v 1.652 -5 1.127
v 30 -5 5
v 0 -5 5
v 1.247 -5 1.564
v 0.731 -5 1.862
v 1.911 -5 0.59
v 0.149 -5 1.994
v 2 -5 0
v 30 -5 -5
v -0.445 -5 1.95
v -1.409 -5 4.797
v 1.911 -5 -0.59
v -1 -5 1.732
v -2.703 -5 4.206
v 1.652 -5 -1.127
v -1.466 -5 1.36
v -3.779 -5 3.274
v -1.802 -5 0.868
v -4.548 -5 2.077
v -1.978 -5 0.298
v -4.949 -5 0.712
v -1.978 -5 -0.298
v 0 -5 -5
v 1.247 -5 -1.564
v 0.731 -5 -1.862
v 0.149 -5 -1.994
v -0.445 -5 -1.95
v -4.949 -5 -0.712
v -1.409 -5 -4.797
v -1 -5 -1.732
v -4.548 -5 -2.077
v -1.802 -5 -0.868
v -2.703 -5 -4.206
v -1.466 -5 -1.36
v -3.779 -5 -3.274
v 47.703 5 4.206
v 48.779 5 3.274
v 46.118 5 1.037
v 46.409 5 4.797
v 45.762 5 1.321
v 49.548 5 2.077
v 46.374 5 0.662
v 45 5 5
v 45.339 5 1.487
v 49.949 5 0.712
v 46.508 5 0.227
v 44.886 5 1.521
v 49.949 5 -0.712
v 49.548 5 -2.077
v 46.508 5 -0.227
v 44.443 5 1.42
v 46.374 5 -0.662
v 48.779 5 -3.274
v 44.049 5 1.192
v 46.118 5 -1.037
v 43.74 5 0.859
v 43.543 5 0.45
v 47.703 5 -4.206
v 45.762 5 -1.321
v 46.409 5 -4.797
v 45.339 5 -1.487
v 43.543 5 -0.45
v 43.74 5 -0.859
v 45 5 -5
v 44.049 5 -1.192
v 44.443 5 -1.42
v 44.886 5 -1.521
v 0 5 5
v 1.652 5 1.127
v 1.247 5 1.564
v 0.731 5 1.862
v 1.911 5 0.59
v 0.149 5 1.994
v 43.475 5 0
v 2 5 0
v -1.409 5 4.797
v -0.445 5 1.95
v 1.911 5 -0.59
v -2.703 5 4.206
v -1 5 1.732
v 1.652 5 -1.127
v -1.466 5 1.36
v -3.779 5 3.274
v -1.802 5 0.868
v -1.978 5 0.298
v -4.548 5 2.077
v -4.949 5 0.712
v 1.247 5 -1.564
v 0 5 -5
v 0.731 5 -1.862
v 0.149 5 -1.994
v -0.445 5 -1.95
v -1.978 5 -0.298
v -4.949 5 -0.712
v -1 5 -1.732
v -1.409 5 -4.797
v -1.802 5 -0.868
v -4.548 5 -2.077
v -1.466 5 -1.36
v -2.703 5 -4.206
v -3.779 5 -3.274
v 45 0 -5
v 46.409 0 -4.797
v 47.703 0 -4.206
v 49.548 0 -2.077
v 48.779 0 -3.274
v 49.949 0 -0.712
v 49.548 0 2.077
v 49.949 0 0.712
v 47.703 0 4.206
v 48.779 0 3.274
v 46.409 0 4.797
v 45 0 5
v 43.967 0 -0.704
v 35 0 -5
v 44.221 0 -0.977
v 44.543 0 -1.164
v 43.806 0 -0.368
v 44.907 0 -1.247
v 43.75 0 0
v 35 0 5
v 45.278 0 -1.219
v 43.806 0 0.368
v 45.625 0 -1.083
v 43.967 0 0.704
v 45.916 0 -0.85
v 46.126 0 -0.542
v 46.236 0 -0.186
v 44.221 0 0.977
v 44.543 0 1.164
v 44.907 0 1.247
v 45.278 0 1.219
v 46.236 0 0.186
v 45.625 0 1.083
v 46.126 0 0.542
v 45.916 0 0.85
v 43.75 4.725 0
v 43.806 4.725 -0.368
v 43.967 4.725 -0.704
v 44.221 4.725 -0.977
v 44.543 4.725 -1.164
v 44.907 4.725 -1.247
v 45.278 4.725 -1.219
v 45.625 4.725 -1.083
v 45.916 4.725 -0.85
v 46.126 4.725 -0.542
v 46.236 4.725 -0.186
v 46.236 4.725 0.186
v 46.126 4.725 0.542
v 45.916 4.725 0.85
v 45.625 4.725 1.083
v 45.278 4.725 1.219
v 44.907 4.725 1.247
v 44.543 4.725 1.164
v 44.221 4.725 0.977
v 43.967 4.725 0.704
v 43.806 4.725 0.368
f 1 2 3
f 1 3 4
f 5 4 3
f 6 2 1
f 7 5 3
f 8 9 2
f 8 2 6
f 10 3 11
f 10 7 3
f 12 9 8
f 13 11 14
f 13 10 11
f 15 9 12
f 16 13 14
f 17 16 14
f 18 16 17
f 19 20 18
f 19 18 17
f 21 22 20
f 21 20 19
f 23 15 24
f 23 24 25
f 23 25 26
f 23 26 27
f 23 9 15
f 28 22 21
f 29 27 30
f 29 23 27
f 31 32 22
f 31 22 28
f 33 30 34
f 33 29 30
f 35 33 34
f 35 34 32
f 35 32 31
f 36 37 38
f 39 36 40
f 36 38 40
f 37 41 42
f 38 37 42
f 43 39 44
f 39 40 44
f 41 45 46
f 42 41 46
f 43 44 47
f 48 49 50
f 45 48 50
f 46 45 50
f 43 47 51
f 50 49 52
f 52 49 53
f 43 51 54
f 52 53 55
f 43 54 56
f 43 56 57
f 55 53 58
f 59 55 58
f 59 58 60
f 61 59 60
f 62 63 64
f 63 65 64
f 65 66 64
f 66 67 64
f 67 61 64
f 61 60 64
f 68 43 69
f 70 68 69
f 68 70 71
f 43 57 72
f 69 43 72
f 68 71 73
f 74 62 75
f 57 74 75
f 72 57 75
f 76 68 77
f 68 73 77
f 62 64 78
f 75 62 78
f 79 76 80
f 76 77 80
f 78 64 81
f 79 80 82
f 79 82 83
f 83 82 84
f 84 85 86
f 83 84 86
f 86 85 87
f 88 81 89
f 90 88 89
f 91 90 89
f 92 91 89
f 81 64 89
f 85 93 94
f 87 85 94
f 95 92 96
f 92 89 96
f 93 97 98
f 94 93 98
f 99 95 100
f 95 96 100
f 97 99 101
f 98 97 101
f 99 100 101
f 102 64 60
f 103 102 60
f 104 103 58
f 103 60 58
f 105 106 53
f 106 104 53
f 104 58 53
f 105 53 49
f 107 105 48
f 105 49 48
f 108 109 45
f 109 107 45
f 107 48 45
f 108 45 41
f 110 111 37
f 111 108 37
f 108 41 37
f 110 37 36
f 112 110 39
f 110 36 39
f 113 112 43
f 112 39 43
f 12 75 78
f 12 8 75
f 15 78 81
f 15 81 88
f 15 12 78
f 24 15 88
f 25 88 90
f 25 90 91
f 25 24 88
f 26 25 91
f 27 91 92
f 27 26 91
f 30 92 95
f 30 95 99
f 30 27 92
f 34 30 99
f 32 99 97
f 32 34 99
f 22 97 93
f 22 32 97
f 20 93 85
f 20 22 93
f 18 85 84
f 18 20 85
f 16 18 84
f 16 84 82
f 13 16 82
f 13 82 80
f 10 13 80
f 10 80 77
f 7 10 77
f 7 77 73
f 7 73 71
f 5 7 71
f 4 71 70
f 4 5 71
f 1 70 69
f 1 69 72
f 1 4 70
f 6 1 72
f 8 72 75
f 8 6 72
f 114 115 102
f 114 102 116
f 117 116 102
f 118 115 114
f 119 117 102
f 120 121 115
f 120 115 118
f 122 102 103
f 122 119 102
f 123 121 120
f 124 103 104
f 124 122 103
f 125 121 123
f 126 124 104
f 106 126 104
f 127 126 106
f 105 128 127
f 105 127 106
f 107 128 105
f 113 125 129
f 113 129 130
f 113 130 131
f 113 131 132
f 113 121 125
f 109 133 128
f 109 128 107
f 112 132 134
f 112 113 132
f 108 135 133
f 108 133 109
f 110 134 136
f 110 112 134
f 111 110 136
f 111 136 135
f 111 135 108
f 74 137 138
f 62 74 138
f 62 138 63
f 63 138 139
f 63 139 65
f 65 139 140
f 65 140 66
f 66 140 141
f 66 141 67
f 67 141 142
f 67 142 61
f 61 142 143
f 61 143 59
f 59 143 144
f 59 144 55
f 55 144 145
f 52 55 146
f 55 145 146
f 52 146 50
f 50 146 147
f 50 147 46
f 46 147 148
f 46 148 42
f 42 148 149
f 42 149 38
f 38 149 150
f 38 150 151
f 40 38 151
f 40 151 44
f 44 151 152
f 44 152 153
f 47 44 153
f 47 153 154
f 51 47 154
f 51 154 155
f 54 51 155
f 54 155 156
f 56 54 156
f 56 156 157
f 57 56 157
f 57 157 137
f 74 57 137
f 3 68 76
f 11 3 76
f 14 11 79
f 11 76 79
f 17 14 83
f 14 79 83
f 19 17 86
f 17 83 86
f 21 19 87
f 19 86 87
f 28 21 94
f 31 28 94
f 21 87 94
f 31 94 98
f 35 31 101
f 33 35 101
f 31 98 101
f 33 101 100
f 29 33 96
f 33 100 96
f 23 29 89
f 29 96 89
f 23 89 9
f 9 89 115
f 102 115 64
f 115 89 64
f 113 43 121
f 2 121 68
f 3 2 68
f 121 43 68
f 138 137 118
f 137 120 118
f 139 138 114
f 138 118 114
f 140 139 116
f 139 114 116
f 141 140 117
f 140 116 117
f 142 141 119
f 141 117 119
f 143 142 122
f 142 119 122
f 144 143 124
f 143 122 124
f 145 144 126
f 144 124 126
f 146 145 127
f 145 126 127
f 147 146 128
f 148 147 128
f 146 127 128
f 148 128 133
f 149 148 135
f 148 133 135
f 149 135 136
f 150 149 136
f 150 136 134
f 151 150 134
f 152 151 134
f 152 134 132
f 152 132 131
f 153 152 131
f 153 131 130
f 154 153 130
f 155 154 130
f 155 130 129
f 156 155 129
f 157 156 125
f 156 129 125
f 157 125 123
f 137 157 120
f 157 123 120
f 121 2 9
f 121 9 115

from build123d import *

# Parameters (mm, degrees)
ESQUISSE1_R                     = 2
BOSS_EXTRU_1_DEPTH              = 5
TROU_TARAUD_M3X0_51_D           = 2.5
TROU_TARAUD_M3X0_51_CSINK_D     = 3.05
TROU_TARAUD_M3X0_51_CSINK_ANGLE = 90
ENL_V_MAT_EXTRU_1_DEPTH         = 6
ENL_V_MAT_EXTRU_1_DEPTH_BACK    = 6


with BuildPart() as part:
    # Esquisse1 → Boss.-Extru.1 (new body, symmetric)
    with BuildSketch(Plane(origin=(0, 0, 0), x_dir=(1, 0, 0), z_dir=(0, 1, 0))):
        with BuildLine():
            Line((0, 5), (45, 5))
            ThreePointArc((45, 5), (50, 0), (45, -5))
            Line((45, -5), (0, -5))
            ThreePointArc((0, -5), (-5, 0), (0, 5))
        make_face()
        Circle(ESQUISSE1_R, mode=Mode.SUBTRACT)
    extrude(amount=BOSS_EXTRU_1_DEPTH, both=True)

    # Trou taraudé M3x0.51 (through all)
    with Locations(Plane(origin=(0, 5, 0), x_dir=(1, 0, 0), z_dir=(0, 1, 0))):
        with Locations((45, 0)):
            CounterSinkHole(TROU_TARAUD_M3X0_51_D / 2, TROU_TARAUD_M3X0_51_CSINK_D / 2, counter_sink_angle=TROU_TARAUD_M3X0_51_CSINK_ANGLE)

    # Esquisse4 → Enlèv. mat.-Extru.1 (cut, two sides)
    with BuildSketch(Plane.XY) as enl_v_mat_extru_1_sk:
        Polygon((35, 0), (50, 0), (50, -5), (30, -5), align=None)
    extrude(amount=ENL_V_MAT_EXTRU_1_DEPTH, mode=Mode.SUBTRACT)
    extrude(enl_v_mat_extru_1_sk.sketch, amount=-ENL_V_MAT_EXTRU_1_DEPTH_BACK, mode=Mode.SUBTRACT)


solid = part.part
